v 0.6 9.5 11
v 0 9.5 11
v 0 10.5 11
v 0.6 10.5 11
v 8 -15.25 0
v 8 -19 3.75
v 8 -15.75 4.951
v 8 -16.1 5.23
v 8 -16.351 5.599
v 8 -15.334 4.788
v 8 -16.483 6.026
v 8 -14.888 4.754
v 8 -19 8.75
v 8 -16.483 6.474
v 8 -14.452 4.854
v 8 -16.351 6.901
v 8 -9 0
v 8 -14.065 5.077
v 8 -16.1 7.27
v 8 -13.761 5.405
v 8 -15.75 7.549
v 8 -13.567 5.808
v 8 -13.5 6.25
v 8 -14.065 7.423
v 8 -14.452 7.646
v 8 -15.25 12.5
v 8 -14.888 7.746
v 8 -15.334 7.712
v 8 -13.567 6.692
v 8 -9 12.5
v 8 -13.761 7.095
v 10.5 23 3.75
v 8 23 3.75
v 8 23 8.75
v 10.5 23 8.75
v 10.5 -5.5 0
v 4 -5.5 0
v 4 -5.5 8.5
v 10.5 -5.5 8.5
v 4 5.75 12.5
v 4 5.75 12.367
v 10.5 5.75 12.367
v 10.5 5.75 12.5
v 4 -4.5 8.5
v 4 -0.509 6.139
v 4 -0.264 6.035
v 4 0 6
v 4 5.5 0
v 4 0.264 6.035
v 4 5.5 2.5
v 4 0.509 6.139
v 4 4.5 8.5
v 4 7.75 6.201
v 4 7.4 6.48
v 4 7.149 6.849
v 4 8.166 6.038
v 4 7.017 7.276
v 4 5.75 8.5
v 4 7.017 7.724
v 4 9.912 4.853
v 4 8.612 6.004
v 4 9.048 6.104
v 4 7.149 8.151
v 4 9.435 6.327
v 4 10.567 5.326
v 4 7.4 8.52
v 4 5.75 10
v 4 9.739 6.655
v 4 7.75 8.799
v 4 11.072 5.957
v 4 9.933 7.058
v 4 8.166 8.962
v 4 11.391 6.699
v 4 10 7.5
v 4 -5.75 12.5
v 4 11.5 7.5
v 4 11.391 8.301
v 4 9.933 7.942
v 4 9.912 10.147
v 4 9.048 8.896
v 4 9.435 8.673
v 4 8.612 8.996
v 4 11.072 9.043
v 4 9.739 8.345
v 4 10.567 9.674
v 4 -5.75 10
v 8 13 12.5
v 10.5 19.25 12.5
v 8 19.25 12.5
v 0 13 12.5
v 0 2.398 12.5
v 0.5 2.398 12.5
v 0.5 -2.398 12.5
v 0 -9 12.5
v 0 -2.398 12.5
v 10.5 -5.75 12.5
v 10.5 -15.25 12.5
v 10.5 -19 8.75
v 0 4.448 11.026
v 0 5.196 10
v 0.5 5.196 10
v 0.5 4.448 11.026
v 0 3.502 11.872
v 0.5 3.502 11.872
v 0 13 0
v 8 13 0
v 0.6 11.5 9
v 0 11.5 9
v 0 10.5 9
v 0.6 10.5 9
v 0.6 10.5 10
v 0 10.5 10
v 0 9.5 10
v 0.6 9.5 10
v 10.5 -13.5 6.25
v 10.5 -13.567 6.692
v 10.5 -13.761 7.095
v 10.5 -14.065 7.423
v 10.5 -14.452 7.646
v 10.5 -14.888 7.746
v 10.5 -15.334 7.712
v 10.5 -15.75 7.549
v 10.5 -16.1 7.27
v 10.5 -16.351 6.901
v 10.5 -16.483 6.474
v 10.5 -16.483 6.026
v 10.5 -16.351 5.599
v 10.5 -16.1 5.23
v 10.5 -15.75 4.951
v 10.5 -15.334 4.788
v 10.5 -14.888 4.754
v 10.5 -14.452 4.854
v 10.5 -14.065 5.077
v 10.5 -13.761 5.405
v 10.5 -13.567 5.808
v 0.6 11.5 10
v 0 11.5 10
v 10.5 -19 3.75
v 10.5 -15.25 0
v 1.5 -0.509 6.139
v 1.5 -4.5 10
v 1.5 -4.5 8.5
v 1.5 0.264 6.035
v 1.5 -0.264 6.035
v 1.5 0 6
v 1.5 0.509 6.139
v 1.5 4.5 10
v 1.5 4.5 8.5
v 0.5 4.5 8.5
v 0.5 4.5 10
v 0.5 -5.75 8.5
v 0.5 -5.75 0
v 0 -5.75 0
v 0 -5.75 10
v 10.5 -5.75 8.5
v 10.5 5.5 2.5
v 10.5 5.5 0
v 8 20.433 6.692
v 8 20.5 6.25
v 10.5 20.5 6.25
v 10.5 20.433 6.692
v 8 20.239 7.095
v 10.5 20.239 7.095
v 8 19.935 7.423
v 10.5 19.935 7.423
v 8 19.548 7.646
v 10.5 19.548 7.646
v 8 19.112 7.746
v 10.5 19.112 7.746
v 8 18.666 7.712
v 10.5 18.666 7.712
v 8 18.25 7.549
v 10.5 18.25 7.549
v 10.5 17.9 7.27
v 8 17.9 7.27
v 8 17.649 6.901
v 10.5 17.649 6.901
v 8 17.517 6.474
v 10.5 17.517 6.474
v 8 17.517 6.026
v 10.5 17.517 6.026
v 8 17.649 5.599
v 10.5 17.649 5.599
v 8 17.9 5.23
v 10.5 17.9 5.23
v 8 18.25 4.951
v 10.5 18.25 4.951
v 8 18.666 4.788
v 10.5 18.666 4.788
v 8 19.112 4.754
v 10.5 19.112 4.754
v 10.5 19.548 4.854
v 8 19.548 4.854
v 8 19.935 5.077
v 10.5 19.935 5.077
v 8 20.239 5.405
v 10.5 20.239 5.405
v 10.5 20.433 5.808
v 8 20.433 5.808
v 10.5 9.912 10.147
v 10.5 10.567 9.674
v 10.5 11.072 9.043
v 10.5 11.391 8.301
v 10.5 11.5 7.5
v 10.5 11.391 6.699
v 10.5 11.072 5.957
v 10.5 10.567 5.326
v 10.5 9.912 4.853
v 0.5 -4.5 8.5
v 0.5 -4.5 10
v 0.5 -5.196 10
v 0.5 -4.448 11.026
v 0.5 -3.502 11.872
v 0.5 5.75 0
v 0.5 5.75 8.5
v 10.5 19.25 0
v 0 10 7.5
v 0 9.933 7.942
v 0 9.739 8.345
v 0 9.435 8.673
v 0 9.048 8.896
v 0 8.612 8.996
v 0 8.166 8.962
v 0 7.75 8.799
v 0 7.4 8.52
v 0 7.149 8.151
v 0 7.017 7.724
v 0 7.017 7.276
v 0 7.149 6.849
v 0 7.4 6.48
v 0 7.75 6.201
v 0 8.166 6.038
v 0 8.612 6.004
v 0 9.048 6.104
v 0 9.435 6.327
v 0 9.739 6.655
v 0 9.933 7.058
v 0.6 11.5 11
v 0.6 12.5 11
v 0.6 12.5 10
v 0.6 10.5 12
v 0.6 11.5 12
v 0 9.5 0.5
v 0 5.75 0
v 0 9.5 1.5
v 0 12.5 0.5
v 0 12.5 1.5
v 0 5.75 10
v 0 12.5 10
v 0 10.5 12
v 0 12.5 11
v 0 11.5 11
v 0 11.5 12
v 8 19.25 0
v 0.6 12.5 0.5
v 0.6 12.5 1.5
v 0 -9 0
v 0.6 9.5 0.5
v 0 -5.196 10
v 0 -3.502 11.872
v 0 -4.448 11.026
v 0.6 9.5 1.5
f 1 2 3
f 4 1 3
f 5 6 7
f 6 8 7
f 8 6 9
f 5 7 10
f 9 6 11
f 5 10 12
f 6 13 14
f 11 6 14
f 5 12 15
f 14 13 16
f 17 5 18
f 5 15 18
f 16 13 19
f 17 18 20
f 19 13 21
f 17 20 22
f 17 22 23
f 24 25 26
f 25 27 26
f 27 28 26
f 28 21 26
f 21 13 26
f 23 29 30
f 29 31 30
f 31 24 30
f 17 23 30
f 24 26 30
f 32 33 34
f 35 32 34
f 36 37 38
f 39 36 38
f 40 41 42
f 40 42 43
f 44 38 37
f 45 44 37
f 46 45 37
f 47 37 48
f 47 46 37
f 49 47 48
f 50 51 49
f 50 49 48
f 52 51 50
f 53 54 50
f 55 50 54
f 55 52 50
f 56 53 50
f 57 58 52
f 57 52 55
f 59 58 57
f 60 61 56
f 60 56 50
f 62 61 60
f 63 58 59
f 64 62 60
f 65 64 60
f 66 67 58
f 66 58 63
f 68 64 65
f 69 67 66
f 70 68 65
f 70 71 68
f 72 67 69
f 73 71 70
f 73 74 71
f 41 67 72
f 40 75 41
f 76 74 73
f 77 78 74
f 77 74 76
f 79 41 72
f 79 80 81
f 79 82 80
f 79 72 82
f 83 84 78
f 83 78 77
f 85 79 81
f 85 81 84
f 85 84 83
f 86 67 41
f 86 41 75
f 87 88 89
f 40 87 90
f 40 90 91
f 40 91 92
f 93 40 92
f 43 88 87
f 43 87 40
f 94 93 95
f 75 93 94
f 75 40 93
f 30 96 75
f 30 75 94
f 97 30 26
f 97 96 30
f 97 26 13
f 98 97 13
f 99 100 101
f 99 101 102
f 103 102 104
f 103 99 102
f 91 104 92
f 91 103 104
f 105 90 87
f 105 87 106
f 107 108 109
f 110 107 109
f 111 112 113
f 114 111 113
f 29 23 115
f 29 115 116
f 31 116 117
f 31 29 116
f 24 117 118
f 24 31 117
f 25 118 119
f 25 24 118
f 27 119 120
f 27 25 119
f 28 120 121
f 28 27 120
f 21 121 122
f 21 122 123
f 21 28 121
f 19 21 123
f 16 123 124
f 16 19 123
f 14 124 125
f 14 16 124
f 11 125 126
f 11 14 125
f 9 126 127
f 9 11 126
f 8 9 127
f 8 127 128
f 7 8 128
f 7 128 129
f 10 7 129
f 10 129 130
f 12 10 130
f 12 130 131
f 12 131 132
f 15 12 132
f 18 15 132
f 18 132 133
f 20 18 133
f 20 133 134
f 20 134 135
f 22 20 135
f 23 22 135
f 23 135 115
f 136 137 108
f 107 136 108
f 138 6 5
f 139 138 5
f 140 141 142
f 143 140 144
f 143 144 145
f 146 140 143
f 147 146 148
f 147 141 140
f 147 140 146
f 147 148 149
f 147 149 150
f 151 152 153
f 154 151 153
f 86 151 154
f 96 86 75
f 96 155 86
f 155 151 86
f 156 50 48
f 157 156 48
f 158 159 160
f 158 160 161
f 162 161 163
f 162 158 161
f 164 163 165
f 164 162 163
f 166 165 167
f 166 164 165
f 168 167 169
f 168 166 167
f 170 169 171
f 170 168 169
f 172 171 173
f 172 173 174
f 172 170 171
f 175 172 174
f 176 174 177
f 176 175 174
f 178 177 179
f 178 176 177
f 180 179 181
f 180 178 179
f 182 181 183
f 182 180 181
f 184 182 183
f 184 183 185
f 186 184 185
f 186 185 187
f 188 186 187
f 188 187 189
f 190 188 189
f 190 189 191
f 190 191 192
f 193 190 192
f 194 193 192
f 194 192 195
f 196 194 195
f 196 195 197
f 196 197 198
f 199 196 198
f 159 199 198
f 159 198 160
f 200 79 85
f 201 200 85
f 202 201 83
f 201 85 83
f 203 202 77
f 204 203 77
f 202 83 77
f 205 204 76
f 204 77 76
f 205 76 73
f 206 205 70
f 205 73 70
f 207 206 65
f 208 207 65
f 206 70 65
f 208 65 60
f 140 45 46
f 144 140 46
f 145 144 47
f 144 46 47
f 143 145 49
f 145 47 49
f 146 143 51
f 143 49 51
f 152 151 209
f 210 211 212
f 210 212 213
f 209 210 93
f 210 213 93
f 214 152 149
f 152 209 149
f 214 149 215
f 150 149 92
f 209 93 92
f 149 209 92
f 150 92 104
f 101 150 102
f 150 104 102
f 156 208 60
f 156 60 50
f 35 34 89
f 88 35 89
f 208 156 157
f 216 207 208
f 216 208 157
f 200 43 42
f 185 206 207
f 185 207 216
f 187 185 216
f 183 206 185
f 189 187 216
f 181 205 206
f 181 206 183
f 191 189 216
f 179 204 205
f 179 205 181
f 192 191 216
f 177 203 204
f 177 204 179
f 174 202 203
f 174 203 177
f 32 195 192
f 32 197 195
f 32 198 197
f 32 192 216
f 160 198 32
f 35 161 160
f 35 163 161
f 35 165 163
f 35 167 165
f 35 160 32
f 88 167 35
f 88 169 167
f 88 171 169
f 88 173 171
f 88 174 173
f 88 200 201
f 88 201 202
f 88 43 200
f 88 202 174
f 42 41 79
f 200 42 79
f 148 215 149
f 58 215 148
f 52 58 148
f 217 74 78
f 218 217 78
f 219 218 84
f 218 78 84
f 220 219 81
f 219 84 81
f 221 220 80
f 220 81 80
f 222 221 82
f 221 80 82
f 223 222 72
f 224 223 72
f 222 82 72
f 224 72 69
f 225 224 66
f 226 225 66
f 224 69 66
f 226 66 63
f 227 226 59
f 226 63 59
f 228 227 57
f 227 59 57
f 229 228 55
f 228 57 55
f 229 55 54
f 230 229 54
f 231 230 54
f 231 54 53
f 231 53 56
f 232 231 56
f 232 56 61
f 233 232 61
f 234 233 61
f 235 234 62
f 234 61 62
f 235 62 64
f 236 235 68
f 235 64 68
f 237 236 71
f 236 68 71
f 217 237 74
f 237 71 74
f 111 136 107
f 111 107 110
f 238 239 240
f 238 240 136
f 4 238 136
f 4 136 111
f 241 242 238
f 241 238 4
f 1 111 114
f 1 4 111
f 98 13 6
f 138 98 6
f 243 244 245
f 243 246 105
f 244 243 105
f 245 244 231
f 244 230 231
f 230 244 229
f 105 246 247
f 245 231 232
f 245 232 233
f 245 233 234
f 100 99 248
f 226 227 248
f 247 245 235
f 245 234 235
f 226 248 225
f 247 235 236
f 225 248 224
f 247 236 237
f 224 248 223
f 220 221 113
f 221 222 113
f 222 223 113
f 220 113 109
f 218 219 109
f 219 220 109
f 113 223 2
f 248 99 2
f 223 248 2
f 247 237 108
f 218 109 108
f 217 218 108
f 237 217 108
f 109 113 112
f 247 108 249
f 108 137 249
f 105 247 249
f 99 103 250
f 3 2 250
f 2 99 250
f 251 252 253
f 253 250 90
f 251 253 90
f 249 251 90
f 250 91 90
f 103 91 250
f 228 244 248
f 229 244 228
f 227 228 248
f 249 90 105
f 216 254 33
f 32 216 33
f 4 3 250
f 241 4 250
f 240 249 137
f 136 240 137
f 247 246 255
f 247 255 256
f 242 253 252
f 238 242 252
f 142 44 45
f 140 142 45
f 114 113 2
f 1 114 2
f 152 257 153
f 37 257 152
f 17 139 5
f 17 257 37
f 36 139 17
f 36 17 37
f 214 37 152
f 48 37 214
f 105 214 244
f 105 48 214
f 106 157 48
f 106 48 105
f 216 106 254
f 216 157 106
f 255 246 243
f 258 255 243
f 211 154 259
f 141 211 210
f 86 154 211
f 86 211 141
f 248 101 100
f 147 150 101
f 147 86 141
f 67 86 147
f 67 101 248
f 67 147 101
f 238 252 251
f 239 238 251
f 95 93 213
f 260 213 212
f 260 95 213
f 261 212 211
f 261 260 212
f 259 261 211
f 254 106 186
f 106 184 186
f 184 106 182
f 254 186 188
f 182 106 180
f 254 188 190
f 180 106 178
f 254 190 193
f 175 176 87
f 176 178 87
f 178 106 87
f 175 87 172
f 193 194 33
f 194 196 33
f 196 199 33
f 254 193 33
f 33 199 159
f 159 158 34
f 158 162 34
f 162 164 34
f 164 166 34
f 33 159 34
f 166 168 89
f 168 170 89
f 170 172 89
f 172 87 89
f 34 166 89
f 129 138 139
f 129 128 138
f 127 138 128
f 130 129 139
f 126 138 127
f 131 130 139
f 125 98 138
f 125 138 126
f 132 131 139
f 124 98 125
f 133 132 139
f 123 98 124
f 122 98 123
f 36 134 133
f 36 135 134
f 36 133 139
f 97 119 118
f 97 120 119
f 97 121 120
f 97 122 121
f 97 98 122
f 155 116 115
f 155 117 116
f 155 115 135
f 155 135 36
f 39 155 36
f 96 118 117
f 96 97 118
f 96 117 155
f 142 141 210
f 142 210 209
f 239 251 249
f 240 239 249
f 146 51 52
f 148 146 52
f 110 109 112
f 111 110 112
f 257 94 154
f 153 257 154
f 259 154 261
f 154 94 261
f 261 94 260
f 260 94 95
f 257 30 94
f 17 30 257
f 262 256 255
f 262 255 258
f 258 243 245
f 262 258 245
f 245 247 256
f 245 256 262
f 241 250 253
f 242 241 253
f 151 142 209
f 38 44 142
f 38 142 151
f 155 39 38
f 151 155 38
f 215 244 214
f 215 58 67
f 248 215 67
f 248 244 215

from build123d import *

# Parameters (mm, degrees)
F3_R      = 1.5
F3_W      = 3.5
F3_H      = 12.5
F4_DEPTH  = 6.5
F5_R      = 1.5
F6_DEPTH  = 4
F7_DEPTH  = 2.5
F8_DEPTH  = 4
F5_W      = 1.25
F5_H      = 1.5
F9_DEPTH  = 25
F10_W     = 3
F10_H     = 1
F11_DEPTH = 0.6
F12_DEPTH = 0.5


with BuildPart() as f4:
    # F3 (on offset) → F4 (new body)
    with BuildSketch(Plane.YZ.offset(4)):
        Polygon((-15.25, 0), (-9, 0), (-9, 12.5), (-15.25, 12.5), (-19, 8.75), (-19, 3.75), align=None)
        with Locations((-15, 6.25)):
            Circle(F3_R, mode=Mode.SUBTRACT)
        with Locations((-7.25, 6.25)):
            Rectangle(F3_W, F3_H)
        with BuildLine():
            Line((5.5, 0), (13, 0))
            Line((13, 0), (13, 12.5))
            Line((13, 12.5), (5.5, 12.5))
            Line((5.5, 12.5), (9.911765, 10.147059))
            ThreePointArc((9.911765, 10.147059), (11.5, 7.5), (9.911765, 4.852941))
            Line((9.911765, 4.852941), (5.5, 2.5))
            Line((5.5, 2.5), (5.5, 0))
        make_face()
        Polygon((13, 12.5), (13, 0), (19.25, 0), (23, 3.75), (23, 8.75), (19.25, 12.5), align=None)
        with Locations((19, 6.25)):
            Circle(F3_R, mode=Mode.SUBTRACT)
    extrude(amount=F4_DEPTH)

    # F5 (on offset) → F6 (join, through all)
    with BuildSketch(Plane.YZ.offset(4)):
        with BuildLine():
            Line((-5.75, 10), (-5.75, 12.5))
            Line((-5.75, 12.5), (-9, 12.5))
            Line((-9, 12.5), (-9, 0))
            Line((-9, 0), (13, 0))
            Line((13, 0), (13, 12.5))
            Line((13, 12.5), (5.75, 12.5))
            Line((5.75, 12.5), (5.75, 10))
            Line((5.75, 10), (5.75, 8.5))
            Line((5.75, 8.5), (4.5, 8.5))
            Line((4.5, 8.5), (0.509121, 6.139305))
            ThreePointArc((0.509121, 6.139305), (0, 6), (-0.509121, 6.139305))
            Line((-0.509121, 6.139305), (-4.5, 8.5))
            Line((-4.5, 8.5), (-5.75, 8.5))
            Line((-5.75, 8.5), (-5.75, 10))
        make_face()
        with Locations((8.5, 7.5)):
            Circle(F5_R, mode=Mode.SUBTRACT)
        Polygon((5.75, 12.5), (-5.75, 12.5), (-5.75, 10), (-4.5, 10), (4.5, 10), (5.75, 10), align=None)
        with BuildLine():
            Line((4.5, 10), (-4.5, 10))
            Line((-4.5, 10), (-4.5, 8.5))
            Line((-4.5, 8.5), (-0.509121, 6.139305))
            ThreePointArc((-0.509121, 6.139305), (0, 6), (0.509121, 6.139305))
            Line((0.509121, 6.139305), (4.5, 8.5))
            Line((4.5, 8.5), (4.5, 10))
        make_face()
    extrude(amount=-F6_DEPTH)

    # F5 (on offset) → F7 (cut)
    with BuildSketch(Plane.YZ.offset(4)):
        with BuildLine():
            Line((4.5, 10), (-4.5, 10))
            Line((-4.5, 10), (-4.5, 8.5))
            Line((-4.5, 8.5), (-0.509121, 6.139305))
            ThreePointArc((-0.509121, 6.139305), (0, 6), (0.509121, 6.139305))
            Line((0.509121, 6.139305), (4.5, 8.5))
            Line((4.5, 8.5), (4.5, 10))
        make_face()
    extrude(amount=-F7_DEPTH, mode=Mode.SUBTRACT)

    # F3 (on offset) → F8 (cut)
    with BuildSketch(Plane.YZ.offset(4)):
        Polygon((-15.25, 0), (-9, 0), (-9, 12.5), (-15.25, 12.5), (-19, 8.75), (-19, 3.75), align=None)
        with Locations((-15, 6.25)):
            Circle(F3_R, mode=Mode.SUBTRACT)
        Polygon((13, 12.5), (13, 0), (19.25, 0), (23, 3.75), (23, 8.75), (19.25, 12.5), align=None)
        with Locations((19, 6.25)):
            Circle(F3_R, mode=Mode.SUBTRACT)
    extrude(amount=F8_DEPTH, mode=Mode.SUBTRACT)

    # F5 (on offset) → F9 (cut)
    with BuildSketch(Plane.YZ.offset(4)):
        Polygon((5.75, 12.5), (-5.75, 12.5), (-5.75, 10), (-4.5, 10), (4.5, 10), (5.75, 10), align=None)
        with Locations((-5.125, 9.25)):
            Rectangle(F5_W, F5_H)
    extrude(amount=F9_DEPTH, mode=Mode.SUBTRACT)

    # F10 (on face) → F11 (cut)
    with BuildSketch(Plane(origin=(0, 0, 0), x_dir=(0, -1, 0), z_dir=(-1, 0, 0))):
        Polygon((-10.5, 12), (-11.5, 12), (-11.5, 11), (-12.5, 11), (-12.5, 10), (-11.5, 10), (-11.5, 9), (-10.5, 9), (-10.5, 10), (-9.5, 10), (-9.5, 11), (-10.5, 11), align=None)
        with Locations((-11, 1)):
            Rectangle(F10_W, F10_H)
    extrude(amount=-F11_DEPTH, mode=Mode.SUBTRACT)

    # F0 (on Right) → F12 (cut)
    with BuildSketch(Plane.YZ):
        with BuildLine():
            Line((-4.5, 8.5), (-5.75, 8.5))
            Line((-5.75, 8.5), (-5.75, 0))
            Line((-5.75, 0), (5.75, 0))
            Line((5.75, 0), (5.75, 8.5))
            Line((5.75, 8.5), (4.5, 8.5))
            Line((4.5, 8.5), (4.5, 10))
            Line((4.5, 10), (5.196152, 10))
            ThreePointArc((5.196152, 10), (0, 13), (-5.196152, 10))
            Line((-5.196152, 10), (-4.5, 10))
            Line((-4.5, 10), (-4.5, 8.5))
        make_face()
    extrude(amount=F12_DEPTH, mode=Mode.SUBTRACT)


solid = f4.part
